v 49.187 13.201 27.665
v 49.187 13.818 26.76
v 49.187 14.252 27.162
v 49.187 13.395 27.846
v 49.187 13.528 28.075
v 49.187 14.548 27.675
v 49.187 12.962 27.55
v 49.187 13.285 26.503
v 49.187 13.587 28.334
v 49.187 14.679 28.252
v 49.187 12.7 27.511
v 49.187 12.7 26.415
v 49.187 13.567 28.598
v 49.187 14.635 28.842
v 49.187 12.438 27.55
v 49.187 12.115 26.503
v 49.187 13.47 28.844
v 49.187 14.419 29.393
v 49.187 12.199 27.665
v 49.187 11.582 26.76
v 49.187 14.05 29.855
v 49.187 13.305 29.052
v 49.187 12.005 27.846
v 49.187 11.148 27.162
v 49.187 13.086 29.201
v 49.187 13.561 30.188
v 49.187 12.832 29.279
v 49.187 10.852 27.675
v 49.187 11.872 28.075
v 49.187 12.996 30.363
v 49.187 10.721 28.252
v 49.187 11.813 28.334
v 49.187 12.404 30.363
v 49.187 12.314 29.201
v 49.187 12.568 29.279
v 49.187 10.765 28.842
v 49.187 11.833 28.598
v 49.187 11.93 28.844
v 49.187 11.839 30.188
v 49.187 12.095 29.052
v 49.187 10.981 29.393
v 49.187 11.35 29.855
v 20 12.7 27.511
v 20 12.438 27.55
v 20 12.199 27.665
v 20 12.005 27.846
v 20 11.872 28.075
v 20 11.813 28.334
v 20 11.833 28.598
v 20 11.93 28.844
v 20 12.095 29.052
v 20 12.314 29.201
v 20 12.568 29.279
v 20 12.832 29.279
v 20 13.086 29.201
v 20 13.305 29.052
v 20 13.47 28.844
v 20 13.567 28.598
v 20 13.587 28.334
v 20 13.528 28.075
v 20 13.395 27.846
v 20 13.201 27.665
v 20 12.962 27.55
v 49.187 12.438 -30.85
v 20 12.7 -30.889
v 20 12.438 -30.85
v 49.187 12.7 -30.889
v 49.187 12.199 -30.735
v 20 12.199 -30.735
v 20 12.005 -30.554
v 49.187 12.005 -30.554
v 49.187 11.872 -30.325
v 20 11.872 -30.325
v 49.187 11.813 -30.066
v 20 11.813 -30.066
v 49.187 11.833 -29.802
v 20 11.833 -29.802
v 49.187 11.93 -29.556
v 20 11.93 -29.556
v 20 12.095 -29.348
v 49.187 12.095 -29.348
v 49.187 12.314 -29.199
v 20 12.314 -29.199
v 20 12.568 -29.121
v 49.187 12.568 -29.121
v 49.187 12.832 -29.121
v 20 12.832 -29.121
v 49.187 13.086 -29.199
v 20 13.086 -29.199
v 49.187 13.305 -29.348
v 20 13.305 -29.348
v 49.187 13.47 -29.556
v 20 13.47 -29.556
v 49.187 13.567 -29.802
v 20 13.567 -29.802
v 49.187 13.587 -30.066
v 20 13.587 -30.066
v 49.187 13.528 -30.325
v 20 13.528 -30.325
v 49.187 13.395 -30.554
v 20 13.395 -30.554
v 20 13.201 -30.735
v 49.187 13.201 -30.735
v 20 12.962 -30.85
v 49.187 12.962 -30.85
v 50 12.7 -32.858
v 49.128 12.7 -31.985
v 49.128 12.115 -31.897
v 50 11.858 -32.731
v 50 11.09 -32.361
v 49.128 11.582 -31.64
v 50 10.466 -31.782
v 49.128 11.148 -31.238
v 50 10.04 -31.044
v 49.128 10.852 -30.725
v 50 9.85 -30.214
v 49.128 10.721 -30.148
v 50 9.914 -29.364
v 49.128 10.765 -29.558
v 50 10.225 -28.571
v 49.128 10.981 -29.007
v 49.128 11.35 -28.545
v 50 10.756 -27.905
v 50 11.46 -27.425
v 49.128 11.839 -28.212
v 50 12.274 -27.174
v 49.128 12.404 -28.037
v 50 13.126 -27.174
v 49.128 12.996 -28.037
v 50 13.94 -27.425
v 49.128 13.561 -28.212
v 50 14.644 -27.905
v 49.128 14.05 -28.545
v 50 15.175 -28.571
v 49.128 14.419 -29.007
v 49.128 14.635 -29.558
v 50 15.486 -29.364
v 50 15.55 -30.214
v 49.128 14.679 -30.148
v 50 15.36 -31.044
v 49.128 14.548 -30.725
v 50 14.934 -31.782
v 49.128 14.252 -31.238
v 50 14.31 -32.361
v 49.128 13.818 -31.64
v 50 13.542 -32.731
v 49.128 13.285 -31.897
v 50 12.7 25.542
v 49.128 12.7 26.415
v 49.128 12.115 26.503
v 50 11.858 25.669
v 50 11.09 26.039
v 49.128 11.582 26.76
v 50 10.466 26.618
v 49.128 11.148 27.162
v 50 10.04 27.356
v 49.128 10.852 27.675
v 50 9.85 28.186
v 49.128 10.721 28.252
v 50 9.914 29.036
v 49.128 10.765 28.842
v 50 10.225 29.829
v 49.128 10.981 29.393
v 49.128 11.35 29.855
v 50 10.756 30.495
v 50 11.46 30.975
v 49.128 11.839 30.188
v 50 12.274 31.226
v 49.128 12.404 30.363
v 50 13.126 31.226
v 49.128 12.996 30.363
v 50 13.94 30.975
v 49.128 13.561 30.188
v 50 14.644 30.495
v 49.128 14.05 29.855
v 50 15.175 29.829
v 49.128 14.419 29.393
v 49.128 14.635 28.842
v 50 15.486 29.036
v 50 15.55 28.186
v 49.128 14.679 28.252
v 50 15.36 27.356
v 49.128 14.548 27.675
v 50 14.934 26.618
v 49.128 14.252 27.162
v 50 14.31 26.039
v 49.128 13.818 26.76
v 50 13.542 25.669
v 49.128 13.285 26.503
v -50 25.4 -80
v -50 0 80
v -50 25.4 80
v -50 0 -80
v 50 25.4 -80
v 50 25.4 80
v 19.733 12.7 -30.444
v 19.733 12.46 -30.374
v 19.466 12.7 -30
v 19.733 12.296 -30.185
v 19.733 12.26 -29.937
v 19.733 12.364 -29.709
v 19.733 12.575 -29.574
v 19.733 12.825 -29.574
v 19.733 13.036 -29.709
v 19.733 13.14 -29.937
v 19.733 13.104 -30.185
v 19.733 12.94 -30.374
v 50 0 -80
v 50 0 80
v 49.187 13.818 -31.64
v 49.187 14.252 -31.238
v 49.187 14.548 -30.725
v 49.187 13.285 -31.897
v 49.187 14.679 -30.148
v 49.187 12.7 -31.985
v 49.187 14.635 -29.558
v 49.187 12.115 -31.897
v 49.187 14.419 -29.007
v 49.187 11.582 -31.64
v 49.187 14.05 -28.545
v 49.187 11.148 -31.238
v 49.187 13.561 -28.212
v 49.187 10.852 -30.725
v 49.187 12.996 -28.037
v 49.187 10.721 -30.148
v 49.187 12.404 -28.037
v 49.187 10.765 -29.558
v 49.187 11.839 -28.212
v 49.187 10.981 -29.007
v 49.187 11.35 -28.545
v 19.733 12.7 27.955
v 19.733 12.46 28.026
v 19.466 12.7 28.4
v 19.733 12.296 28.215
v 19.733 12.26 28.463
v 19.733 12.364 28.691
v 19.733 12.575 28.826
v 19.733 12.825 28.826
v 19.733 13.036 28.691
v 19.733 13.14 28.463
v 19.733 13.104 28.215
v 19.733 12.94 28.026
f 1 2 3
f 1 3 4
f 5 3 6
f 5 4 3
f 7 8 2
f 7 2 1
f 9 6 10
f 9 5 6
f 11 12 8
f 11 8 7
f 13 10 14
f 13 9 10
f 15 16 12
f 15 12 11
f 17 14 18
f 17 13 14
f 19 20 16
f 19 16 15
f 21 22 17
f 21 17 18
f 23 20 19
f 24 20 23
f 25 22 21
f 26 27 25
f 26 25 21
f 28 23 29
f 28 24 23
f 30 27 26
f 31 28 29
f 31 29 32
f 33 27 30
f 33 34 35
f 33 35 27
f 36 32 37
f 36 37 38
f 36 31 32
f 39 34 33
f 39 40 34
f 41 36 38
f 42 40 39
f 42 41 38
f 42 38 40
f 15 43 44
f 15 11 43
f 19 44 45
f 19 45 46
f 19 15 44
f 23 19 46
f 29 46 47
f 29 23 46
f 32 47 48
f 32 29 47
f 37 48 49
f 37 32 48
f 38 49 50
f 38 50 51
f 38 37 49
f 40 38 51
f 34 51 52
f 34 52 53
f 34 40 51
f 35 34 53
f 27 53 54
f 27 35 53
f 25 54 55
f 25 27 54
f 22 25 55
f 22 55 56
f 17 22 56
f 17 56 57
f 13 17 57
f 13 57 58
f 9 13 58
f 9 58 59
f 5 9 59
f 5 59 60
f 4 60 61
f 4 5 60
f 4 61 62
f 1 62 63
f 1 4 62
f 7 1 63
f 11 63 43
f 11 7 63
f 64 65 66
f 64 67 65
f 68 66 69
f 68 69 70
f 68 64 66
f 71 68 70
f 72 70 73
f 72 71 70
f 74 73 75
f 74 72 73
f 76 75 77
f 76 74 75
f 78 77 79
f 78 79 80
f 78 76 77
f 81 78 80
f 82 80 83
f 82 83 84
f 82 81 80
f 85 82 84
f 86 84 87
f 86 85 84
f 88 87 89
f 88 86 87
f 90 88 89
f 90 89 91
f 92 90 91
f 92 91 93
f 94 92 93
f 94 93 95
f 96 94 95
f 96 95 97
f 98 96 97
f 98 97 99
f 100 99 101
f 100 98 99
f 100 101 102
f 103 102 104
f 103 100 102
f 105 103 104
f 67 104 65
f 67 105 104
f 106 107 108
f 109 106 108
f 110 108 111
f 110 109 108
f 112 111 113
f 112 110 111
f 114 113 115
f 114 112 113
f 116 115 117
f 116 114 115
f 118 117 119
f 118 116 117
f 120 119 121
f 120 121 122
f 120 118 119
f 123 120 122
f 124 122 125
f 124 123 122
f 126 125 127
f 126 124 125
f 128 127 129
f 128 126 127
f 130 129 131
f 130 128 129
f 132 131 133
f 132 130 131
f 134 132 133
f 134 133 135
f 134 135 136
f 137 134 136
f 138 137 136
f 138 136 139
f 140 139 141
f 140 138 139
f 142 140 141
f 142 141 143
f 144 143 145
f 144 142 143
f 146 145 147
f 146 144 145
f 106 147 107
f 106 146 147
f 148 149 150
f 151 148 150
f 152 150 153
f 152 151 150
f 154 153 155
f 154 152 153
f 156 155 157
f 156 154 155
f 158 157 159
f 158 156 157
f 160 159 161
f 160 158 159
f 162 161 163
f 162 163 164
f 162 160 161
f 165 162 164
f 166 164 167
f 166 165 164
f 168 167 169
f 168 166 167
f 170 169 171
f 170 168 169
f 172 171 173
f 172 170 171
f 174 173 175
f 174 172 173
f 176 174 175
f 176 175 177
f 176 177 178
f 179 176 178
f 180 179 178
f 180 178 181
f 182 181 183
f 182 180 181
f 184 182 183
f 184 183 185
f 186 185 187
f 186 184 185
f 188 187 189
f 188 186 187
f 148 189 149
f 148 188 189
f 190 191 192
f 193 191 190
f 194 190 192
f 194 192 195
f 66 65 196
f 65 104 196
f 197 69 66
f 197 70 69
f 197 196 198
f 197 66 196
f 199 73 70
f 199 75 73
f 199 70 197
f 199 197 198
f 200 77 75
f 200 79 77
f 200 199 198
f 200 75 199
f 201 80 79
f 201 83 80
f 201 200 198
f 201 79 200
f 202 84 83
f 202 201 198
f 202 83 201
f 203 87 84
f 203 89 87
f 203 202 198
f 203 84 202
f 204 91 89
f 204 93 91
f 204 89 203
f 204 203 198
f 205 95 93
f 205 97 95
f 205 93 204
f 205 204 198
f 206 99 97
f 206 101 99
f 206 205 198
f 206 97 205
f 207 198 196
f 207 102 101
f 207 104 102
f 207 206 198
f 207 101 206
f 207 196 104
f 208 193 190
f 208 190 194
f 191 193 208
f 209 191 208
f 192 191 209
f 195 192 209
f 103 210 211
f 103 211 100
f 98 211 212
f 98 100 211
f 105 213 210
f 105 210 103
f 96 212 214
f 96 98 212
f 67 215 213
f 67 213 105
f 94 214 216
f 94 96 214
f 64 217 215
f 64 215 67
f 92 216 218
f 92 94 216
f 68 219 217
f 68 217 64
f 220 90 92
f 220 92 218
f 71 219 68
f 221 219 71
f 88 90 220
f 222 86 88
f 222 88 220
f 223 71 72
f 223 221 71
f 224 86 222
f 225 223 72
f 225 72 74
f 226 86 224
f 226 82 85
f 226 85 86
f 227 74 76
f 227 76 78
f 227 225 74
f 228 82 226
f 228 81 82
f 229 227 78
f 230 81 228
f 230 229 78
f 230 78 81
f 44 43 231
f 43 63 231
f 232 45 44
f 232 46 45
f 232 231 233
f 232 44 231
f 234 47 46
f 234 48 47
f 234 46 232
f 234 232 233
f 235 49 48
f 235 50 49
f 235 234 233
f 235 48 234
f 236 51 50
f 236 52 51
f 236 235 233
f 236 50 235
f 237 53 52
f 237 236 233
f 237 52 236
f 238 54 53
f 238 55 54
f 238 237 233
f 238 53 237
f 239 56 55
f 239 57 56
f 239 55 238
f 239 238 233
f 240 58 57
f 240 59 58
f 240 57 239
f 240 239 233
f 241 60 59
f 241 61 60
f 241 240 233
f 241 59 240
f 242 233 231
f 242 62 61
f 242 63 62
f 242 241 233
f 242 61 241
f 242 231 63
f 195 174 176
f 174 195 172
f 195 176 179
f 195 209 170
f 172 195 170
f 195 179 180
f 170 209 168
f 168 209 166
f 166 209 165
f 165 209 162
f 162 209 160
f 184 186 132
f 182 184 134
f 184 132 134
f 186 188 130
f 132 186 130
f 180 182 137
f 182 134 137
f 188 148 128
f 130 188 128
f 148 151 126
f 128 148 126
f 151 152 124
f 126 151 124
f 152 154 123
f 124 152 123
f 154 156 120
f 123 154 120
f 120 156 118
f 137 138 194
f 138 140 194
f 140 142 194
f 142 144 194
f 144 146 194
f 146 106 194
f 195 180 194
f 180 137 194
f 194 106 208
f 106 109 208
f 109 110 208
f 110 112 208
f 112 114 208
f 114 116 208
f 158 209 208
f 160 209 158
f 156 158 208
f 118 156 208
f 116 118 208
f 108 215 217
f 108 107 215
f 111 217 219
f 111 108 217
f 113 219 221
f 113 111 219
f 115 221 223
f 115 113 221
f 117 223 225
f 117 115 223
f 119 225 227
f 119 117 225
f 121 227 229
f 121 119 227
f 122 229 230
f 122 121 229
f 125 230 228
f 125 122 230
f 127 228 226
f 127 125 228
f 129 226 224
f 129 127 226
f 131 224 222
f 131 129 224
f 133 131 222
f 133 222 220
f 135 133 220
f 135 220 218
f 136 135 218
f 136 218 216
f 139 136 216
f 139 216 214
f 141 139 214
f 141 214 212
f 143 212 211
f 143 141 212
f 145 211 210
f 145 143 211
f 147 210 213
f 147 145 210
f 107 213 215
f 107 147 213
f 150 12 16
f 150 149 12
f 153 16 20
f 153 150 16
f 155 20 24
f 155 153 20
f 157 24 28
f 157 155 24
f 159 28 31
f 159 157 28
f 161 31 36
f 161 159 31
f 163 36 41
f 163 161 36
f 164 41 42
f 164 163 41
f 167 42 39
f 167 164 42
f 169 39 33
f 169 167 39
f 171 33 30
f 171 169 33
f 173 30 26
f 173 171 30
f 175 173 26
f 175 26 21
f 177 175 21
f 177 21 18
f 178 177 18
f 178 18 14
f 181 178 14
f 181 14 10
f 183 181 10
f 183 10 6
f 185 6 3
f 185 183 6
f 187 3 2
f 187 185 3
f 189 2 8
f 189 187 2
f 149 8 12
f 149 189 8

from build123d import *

# Parameters (mm, degrees)
SKETCH1_W                                   = 100
SKETCH1_H                                   = 160
BOSS_EXTRUDE1_DEPTH                         = 25.4
CBORE_FOR_0_BINDING_HEAD_MACHINE_SC_2_COUNT = 2
CBORE_FOR_0_BINDING_HEAD_MACHINE_SC_2_PITCH = 58.4


with BuildPart() as part:
    # Sketch1 → Boss-Extrude1 (new body)
    with BuildSketch(Plane(origin=(0, 0, 0), x_dir=(1, 0, 0), z_dir=(0, 1, 0))):
        Rectangle(SKETCH1_W, SKETCH1_H)
    extrude(amount=BOSS_EXTRUDE1_DEPTH)

    # Sketch3 → CBORE for #0 Binding Head Machine Screw1 (revolve, cut)
    with BuildSketch(Plane(origin=(50, 12.7, 28.4), x_dir=(0, 0, -1), z_dir=(0, 1, 0))):
        Polygon((0, 0), (0, 30.53416509), (0.889, 30), (0.889, 0.8128), (1.98501, 0.8128), (1.98501, 0.87249), (2.8575, 0), align=None)
    cbore_for_0_binding_head_machine_screw1 = revolve(axis=Axis((56.35, 12.7, 28.4), (-1, 0, 0)), mode=Mode.SUBTRACT)

    # CBORE for _0 Binding Head Machine Sc 2: CBORE for #0 Binding Head Machine Screw1 ×2
    with Locations(*[(0, 0, -i * CBORE_FOR_0_BINDING_HEAD_MACHINE_SC_2_PITCH) for i in range(1, CBORE_FOR_0_BINDING_HEAD_MACHINE_SC_2_COUNT)]):
        add(cbore_for_0_binding_head_machine_screw1, mode=Mode.SUBTRACT)


solid = part.part
